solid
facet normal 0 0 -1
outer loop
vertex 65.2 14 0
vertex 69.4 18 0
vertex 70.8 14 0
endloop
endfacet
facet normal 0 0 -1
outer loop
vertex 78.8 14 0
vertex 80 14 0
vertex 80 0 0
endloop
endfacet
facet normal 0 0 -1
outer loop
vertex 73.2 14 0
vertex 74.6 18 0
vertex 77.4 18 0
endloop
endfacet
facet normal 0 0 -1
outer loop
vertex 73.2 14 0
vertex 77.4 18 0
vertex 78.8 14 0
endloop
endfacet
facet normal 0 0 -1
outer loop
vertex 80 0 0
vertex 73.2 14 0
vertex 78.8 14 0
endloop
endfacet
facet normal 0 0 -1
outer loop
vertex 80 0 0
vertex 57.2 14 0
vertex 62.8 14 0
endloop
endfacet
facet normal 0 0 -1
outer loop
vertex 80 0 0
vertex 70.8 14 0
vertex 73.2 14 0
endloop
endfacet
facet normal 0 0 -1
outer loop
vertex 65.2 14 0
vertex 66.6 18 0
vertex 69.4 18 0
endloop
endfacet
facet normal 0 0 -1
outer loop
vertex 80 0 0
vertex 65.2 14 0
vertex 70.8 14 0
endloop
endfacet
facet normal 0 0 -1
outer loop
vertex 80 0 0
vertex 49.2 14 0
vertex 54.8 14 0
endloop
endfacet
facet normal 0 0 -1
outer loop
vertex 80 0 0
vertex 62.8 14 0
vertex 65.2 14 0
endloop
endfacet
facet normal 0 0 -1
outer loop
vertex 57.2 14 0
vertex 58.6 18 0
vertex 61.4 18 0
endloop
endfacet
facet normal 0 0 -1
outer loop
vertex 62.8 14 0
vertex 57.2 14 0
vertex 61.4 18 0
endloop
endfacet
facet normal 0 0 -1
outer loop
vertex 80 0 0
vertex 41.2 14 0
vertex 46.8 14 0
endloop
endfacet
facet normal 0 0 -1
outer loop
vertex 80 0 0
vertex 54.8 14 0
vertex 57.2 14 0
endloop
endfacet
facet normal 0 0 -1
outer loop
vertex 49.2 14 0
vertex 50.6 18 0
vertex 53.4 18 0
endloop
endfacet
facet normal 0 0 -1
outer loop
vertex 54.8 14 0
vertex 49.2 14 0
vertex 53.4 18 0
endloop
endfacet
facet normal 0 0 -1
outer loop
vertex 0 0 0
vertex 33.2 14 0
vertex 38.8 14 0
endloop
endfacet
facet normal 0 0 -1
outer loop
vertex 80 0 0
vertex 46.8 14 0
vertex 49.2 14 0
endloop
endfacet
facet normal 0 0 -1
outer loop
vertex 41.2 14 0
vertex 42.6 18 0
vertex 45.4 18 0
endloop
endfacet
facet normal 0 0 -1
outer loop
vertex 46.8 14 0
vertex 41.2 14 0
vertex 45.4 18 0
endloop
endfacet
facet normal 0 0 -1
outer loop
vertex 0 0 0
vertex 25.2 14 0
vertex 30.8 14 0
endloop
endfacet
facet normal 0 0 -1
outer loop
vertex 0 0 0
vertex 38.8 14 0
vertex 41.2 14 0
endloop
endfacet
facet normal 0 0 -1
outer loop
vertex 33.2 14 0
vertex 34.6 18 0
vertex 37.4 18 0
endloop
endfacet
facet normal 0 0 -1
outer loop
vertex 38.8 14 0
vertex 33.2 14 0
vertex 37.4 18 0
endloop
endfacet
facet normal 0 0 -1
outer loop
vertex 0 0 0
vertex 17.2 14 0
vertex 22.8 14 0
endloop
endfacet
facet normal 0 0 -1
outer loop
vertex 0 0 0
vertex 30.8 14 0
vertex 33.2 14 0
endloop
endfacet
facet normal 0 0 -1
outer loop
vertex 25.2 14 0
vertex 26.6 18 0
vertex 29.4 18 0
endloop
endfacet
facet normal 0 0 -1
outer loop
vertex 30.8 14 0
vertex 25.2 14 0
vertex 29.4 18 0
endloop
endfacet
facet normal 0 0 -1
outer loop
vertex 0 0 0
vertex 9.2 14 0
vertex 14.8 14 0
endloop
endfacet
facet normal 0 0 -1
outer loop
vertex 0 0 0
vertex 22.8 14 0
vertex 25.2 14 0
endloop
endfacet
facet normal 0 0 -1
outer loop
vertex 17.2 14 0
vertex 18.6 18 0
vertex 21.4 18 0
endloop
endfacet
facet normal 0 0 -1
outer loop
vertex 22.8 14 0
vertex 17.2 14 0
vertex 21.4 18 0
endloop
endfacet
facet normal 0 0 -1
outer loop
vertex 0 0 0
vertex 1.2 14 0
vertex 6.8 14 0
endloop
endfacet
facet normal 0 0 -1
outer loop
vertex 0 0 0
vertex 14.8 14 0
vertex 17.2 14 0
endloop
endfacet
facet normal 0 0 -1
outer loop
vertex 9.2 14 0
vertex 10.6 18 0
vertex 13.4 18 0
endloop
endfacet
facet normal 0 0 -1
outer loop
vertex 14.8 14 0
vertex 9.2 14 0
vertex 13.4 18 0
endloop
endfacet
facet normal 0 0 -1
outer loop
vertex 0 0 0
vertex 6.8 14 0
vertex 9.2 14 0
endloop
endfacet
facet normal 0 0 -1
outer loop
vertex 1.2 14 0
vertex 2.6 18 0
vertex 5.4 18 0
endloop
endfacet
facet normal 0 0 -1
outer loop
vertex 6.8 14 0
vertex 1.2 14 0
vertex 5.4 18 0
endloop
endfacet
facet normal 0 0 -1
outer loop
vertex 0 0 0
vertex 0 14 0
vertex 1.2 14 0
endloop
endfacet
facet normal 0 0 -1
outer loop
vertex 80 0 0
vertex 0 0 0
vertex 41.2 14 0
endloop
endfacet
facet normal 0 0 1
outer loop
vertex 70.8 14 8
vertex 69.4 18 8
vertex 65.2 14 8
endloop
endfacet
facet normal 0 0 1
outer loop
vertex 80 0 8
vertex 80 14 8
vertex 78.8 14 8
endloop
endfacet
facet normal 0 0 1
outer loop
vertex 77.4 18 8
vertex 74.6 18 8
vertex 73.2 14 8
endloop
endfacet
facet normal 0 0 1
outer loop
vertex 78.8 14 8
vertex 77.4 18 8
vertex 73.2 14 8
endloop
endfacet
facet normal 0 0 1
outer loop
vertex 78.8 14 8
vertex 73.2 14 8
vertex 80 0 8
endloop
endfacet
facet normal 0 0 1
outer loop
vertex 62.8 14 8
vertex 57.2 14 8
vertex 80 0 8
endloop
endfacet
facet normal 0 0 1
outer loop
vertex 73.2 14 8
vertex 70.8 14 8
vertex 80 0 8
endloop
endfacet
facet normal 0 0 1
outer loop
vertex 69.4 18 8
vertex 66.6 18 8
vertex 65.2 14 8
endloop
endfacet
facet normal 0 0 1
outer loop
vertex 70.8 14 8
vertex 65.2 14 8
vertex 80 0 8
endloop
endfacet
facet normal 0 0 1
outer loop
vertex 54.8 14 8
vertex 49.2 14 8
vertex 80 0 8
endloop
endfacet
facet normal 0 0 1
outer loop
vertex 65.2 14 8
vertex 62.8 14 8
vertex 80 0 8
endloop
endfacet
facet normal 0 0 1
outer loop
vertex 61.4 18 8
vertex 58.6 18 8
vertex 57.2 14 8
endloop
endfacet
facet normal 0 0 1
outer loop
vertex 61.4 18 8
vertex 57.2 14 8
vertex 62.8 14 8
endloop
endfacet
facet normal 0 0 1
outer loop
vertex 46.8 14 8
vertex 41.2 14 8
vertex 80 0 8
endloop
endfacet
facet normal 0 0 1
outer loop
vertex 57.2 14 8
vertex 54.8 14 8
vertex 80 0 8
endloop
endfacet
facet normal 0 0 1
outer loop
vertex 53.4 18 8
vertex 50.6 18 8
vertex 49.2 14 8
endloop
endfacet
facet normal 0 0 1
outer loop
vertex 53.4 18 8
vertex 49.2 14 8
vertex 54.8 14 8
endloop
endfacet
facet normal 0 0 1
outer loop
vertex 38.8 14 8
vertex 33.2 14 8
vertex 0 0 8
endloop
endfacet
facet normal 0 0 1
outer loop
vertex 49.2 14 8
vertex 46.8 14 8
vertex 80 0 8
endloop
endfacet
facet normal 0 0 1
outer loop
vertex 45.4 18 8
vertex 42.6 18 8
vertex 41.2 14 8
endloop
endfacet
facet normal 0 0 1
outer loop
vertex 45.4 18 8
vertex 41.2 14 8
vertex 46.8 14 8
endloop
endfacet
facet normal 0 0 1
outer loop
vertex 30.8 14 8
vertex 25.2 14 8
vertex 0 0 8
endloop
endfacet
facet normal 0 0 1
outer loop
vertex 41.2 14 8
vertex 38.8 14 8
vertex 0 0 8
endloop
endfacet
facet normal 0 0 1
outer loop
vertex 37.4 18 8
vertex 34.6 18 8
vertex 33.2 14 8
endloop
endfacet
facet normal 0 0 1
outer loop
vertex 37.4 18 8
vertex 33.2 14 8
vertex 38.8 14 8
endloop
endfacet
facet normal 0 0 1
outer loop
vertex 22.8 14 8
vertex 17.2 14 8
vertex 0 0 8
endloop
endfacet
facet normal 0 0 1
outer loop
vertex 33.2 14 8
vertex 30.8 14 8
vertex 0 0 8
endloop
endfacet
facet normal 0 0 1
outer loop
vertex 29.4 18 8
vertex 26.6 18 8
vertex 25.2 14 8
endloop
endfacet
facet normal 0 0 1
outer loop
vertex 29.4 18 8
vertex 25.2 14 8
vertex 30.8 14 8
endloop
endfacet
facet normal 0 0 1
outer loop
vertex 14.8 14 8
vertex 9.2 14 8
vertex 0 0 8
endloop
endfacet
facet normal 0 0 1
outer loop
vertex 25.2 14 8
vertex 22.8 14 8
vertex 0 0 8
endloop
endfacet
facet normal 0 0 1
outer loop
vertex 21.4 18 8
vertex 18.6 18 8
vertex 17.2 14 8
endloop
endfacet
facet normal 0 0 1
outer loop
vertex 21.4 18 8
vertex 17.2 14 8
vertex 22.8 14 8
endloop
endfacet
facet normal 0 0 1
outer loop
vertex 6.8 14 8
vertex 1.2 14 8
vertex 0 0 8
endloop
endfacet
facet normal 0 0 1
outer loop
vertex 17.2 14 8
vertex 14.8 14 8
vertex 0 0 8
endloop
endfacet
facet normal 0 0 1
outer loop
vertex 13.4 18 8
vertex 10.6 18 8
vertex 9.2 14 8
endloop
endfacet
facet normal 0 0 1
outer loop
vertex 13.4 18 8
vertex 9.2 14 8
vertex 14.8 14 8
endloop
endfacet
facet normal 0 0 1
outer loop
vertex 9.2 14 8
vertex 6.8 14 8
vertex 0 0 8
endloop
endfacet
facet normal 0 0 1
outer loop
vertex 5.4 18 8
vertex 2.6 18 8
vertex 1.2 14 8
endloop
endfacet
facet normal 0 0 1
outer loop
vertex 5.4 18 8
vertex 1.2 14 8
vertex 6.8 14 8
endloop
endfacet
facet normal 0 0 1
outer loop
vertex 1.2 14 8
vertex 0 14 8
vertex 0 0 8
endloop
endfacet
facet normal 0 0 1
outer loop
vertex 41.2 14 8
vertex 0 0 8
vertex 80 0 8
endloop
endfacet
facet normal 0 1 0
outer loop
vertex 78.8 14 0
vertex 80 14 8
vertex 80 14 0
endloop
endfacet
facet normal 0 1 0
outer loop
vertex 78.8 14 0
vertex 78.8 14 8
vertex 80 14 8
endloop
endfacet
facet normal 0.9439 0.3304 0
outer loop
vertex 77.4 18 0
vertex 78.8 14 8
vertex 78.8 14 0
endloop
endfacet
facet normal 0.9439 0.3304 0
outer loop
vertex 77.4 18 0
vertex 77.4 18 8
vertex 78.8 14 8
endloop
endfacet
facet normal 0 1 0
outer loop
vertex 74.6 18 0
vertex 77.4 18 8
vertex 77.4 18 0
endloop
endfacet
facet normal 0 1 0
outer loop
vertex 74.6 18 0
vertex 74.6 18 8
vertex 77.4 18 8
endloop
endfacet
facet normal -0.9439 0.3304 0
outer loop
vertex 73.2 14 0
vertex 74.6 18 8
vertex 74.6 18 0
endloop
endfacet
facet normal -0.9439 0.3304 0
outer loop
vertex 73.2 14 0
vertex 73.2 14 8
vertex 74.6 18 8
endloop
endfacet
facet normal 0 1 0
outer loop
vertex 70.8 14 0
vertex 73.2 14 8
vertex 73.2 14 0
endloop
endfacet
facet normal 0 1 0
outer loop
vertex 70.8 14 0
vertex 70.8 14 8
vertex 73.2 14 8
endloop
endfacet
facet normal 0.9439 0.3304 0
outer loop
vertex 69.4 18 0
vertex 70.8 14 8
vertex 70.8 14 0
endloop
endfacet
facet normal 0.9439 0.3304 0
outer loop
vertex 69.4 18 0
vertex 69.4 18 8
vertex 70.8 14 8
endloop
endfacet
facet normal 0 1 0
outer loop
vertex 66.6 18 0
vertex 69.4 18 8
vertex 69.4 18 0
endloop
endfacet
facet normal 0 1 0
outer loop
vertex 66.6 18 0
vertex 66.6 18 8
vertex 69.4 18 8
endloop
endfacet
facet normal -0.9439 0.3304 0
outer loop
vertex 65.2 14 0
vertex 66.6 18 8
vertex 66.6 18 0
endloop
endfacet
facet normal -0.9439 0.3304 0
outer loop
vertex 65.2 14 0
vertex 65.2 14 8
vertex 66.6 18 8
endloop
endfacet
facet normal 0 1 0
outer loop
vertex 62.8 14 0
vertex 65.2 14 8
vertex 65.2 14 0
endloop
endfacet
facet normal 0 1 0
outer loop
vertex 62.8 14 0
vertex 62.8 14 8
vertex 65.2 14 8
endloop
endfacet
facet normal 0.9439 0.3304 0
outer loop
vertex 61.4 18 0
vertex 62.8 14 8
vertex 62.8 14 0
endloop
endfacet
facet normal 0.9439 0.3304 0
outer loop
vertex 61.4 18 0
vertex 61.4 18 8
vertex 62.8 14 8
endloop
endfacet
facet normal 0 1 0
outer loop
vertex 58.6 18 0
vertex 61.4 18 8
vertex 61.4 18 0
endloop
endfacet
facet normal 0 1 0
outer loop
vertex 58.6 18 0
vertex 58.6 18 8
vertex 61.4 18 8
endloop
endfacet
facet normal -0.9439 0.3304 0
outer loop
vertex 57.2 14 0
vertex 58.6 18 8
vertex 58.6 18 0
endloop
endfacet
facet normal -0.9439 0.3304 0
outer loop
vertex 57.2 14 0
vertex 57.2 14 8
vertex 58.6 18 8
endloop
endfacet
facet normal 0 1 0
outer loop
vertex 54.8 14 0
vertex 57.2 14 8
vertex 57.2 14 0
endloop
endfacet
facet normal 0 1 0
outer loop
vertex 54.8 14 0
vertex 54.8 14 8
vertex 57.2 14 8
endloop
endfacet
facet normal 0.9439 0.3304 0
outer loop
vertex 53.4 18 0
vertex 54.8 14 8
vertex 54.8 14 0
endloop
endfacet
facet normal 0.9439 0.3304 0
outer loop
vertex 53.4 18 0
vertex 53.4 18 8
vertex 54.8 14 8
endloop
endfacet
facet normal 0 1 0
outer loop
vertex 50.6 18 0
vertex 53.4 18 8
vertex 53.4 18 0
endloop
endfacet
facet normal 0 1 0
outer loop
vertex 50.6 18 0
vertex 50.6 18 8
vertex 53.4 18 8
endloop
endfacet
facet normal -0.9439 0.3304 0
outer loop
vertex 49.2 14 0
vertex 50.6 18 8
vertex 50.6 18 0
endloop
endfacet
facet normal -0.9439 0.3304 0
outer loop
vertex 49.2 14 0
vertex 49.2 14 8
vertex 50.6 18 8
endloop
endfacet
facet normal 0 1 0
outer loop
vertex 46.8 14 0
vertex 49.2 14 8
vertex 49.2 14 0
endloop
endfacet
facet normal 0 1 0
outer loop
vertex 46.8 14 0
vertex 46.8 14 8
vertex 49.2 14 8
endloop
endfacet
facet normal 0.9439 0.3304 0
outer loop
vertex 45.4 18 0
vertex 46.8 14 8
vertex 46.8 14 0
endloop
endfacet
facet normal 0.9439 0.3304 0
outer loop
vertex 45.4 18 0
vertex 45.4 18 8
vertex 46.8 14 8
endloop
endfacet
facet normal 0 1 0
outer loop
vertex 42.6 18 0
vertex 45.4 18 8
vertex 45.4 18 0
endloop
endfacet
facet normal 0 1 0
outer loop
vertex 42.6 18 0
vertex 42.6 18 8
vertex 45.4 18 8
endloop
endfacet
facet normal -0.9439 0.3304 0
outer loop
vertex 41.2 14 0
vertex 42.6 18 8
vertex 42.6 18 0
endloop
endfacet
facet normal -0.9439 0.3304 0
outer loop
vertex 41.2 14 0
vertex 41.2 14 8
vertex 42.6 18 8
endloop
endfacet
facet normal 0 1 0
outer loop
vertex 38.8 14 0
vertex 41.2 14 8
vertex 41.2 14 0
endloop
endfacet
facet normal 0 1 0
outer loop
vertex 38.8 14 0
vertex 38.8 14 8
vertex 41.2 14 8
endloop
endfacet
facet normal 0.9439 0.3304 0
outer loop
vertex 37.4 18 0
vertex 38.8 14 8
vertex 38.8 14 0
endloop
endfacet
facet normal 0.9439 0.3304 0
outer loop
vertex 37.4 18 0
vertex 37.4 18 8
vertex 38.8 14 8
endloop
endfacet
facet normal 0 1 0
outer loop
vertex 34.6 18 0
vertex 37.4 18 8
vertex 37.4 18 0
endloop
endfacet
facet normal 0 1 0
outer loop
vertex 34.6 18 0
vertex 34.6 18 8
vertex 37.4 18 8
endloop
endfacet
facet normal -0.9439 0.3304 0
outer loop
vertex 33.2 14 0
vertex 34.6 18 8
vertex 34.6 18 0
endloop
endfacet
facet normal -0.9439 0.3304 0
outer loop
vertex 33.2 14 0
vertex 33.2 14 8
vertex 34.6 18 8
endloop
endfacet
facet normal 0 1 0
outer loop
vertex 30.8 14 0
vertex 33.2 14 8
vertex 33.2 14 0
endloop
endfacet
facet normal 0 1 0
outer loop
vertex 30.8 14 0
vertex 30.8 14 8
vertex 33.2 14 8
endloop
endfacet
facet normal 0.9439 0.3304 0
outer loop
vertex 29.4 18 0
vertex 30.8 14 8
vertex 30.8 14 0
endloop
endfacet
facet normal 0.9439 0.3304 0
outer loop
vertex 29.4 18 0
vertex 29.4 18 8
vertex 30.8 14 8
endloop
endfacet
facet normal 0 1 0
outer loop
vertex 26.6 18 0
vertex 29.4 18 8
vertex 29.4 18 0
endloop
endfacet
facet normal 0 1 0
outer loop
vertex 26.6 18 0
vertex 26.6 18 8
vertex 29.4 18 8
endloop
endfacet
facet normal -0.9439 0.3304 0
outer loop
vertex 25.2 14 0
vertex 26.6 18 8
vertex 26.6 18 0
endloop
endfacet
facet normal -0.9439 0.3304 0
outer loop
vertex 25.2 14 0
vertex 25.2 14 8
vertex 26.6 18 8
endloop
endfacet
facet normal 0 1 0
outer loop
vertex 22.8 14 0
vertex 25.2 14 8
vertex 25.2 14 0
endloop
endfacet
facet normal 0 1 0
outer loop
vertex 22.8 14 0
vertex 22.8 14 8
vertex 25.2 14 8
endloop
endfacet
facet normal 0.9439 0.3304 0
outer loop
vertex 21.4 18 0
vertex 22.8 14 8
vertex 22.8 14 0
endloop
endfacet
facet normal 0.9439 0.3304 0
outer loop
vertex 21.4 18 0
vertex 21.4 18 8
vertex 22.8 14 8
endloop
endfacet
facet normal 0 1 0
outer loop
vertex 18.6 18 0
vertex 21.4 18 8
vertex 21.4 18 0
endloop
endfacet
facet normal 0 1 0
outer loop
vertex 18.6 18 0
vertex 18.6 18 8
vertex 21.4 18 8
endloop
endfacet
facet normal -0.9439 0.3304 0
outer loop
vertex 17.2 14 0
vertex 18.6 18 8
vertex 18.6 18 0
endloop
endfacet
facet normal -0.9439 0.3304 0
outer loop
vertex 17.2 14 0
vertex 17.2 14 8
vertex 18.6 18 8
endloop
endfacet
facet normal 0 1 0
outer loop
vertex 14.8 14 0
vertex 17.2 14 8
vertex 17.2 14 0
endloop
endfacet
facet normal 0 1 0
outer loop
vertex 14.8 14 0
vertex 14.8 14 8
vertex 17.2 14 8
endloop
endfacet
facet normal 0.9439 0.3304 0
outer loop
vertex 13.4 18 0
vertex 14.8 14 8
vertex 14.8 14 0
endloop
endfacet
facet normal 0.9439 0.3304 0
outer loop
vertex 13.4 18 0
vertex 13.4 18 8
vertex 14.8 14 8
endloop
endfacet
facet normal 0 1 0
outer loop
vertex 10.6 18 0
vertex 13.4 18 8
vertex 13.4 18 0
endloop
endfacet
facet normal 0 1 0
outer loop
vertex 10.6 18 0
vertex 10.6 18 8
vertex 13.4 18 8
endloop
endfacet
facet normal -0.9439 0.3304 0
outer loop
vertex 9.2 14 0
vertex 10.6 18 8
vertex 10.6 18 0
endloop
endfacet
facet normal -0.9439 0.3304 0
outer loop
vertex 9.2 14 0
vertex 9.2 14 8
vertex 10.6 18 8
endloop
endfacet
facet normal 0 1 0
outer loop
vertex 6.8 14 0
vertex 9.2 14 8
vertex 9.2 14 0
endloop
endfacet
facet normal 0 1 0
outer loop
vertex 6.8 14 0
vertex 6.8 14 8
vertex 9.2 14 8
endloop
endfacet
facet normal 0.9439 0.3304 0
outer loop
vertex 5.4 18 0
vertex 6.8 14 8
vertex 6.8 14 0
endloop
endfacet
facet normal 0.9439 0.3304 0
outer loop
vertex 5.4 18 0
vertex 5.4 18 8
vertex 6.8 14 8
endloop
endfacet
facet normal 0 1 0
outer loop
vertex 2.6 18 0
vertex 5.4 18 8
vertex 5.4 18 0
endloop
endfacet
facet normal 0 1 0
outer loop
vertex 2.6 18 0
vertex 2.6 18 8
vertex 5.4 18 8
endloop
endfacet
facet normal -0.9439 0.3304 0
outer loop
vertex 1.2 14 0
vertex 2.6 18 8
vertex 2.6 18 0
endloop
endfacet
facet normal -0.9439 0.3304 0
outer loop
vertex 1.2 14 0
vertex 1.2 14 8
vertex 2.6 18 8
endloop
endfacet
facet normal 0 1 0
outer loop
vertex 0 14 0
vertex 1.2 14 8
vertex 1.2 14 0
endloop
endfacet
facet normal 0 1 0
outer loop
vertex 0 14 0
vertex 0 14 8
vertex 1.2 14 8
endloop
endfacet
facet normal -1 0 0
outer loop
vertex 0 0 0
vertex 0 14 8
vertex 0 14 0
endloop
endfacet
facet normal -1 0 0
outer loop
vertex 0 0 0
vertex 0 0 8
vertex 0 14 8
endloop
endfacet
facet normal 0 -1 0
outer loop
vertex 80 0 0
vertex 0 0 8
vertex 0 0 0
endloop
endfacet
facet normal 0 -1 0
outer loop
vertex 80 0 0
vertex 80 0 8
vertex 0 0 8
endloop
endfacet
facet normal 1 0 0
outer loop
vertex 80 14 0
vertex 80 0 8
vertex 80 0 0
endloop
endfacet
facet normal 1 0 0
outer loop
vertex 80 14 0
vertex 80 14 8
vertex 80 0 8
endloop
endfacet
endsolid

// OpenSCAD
$fn = 32;

// ----------------------------------------------------------------------
// Gear rack: 10 teeth, pitch 8 mm
// ----------------------------------------------------------------------

// --- parameters (mm) ---
teeth = 10;               // number of teeth
pitch = 8;                // tooth pitch, X
root_w = 5.6;             // tooth width at the root
tip_w = 2.8;              // tooth width at the tip
base_h = 14;              // rack body height, Y
tooth_h = 4;              // tooth height above the body
plate_t = 8;              // rack width, Z (extrusion height)

rack_l = teeth * pitch;  // overall length
total_h = base_h + tooth_h;  // overall height

profile = [[0, 0], [80, 0], [80, 14], [78.8, 14], [77.4, 18], [74.6, 18], [73.2, 14], [70.8, 14], [69.4, 18], [66.6, 18], [65.2, 14], [62.8, 14], [61.4, 18], [58.6, 18], [57.2, 14], [54.8, 14], [53.4, 18], [50.6, 18], [49.2, 14], [46.8, 14], [45.4, 18], [42.6, 18], [41.2, 14], [38.8, 14], [37.4, 18], [34.6, 18], [33.2, 14], [30.8, 14], [29.4, 18], [26.6, 18], [25.2, 14], [22.8, 14], [21.4, 18], [18.6, 18], [17.2, 14], [14.8, 14], [13.4, 18], [10.6, 18], [9.2, 14], [6.8, 14], [5.4, 18], [2.6, 18], [1.2, 14], [0, 14]];  // primary outline, 44 points, counter clockwise

// --- the one profile operation ---
linear_extrude(height = plate_t) polygon(points = profile);
